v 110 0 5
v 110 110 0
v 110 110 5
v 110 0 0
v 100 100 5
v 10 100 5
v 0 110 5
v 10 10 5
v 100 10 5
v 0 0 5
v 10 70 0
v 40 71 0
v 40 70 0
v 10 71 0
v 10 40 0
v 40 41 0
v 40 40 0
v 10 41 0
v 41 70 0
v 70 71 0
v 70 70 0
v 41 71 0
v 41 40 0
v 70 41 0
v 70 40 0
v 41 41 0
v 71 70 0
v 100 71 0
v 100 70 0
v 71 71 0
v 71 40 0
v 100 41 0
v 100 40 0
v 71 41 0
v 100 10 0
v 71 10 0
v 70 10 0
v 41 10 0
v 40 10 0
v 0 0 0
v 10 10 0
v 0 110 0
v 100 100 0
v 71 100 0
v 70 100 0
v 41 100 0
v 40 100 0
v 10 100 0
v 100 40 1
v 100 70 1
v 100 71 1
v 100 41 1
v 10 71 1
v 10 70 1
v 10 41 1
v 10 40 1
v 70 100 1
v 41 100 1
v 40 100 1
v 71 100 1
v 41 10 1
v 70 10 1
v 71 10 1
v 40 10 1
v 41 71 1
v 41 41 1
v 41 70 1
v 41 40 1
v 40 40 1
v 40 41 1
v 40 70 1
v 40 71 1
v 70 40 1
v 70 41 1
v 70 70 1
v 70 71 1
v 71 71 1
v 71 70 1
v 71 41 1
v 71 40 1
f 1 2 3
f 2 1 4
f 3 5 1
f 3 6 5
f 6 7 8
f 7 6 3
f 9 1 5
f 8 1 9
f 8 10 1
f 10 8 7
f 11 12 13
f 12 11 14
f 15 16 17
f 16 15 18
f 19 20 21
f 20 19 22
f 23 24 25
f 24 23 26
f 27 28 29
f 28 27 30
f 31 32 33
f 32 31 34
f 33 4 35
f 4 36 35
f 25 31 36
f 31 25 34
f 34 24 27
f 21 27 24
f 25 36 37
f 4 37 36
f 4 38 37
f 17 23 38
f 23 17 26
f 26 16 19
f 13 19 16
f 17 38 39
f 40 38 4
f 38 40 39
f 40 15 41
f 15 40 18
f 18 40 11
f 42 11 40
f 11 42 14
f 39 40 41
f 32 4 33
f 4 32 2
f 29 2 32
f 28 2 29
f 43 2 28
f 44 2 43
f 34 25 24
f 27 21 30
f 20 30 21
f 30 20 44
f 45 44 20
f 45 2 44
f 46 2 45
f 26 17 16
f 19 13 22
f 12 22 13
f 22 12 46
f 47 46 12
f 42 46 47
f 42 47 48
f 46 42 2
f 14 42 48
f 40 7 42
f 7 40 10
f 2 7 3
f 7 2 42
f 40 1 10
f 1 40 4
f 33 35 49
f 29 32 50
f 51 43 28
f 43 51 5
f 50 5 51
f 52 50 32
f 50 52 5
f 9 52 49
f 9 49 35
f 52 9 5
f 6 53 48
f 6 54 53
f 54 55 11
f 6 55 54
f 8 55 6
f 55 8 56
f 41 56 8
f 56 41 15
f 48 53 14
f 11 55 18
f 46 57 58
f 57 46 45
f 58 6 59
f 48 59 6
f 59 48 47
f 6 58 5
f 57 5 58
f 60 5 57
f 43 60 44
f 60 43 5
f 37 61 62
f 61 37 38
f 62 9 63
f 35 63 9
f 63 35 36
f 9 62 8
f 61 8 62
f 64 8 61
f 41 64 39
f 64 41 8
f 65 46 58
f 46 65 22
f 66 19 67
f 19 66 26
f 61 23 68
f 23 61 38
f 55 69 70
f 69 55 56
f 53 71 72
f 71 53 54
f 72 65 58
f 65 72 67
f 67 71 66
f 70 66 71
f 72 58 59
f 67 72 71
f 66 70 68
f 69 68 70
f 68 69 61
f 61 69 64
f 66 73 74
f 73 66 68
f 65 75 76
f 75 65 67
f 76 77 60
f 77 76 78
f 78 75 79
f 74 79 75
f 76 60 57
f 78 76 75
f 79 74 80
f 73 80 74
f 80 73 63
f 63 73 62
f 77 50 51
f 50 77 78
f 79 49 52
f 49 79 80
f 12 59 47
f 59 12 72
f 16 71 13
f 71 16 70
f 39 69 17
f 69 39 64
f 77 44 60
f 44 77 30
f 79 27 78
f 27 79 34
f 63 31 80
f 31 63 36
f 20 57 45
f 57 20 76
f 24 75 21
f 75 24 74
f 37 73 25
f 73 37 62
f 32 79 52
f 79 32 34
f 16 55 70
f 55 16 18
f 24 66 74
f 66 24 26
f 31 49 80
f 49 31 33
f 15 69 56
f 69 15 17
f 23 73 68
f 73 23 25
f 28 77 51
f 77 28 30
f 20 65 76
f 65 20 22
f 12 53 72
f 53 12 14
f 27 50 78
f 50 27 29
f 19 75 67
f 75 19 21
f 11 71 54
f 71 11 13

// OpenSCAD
difference() {
    cube([110, 110, 5]);
    translate([10, 10, 0]) cube([90, 90, 6]);
}

union() {
    translate([40, 0, 0]) cube([1, 100, 1]);
    translate([70, 0, 0]) cube([1, 100, 1]);
    translate([0, 40, 0]) cube([100, 1, 1]);
    translate([0, 70, 0]) cube([100, 1, 1]);
}
